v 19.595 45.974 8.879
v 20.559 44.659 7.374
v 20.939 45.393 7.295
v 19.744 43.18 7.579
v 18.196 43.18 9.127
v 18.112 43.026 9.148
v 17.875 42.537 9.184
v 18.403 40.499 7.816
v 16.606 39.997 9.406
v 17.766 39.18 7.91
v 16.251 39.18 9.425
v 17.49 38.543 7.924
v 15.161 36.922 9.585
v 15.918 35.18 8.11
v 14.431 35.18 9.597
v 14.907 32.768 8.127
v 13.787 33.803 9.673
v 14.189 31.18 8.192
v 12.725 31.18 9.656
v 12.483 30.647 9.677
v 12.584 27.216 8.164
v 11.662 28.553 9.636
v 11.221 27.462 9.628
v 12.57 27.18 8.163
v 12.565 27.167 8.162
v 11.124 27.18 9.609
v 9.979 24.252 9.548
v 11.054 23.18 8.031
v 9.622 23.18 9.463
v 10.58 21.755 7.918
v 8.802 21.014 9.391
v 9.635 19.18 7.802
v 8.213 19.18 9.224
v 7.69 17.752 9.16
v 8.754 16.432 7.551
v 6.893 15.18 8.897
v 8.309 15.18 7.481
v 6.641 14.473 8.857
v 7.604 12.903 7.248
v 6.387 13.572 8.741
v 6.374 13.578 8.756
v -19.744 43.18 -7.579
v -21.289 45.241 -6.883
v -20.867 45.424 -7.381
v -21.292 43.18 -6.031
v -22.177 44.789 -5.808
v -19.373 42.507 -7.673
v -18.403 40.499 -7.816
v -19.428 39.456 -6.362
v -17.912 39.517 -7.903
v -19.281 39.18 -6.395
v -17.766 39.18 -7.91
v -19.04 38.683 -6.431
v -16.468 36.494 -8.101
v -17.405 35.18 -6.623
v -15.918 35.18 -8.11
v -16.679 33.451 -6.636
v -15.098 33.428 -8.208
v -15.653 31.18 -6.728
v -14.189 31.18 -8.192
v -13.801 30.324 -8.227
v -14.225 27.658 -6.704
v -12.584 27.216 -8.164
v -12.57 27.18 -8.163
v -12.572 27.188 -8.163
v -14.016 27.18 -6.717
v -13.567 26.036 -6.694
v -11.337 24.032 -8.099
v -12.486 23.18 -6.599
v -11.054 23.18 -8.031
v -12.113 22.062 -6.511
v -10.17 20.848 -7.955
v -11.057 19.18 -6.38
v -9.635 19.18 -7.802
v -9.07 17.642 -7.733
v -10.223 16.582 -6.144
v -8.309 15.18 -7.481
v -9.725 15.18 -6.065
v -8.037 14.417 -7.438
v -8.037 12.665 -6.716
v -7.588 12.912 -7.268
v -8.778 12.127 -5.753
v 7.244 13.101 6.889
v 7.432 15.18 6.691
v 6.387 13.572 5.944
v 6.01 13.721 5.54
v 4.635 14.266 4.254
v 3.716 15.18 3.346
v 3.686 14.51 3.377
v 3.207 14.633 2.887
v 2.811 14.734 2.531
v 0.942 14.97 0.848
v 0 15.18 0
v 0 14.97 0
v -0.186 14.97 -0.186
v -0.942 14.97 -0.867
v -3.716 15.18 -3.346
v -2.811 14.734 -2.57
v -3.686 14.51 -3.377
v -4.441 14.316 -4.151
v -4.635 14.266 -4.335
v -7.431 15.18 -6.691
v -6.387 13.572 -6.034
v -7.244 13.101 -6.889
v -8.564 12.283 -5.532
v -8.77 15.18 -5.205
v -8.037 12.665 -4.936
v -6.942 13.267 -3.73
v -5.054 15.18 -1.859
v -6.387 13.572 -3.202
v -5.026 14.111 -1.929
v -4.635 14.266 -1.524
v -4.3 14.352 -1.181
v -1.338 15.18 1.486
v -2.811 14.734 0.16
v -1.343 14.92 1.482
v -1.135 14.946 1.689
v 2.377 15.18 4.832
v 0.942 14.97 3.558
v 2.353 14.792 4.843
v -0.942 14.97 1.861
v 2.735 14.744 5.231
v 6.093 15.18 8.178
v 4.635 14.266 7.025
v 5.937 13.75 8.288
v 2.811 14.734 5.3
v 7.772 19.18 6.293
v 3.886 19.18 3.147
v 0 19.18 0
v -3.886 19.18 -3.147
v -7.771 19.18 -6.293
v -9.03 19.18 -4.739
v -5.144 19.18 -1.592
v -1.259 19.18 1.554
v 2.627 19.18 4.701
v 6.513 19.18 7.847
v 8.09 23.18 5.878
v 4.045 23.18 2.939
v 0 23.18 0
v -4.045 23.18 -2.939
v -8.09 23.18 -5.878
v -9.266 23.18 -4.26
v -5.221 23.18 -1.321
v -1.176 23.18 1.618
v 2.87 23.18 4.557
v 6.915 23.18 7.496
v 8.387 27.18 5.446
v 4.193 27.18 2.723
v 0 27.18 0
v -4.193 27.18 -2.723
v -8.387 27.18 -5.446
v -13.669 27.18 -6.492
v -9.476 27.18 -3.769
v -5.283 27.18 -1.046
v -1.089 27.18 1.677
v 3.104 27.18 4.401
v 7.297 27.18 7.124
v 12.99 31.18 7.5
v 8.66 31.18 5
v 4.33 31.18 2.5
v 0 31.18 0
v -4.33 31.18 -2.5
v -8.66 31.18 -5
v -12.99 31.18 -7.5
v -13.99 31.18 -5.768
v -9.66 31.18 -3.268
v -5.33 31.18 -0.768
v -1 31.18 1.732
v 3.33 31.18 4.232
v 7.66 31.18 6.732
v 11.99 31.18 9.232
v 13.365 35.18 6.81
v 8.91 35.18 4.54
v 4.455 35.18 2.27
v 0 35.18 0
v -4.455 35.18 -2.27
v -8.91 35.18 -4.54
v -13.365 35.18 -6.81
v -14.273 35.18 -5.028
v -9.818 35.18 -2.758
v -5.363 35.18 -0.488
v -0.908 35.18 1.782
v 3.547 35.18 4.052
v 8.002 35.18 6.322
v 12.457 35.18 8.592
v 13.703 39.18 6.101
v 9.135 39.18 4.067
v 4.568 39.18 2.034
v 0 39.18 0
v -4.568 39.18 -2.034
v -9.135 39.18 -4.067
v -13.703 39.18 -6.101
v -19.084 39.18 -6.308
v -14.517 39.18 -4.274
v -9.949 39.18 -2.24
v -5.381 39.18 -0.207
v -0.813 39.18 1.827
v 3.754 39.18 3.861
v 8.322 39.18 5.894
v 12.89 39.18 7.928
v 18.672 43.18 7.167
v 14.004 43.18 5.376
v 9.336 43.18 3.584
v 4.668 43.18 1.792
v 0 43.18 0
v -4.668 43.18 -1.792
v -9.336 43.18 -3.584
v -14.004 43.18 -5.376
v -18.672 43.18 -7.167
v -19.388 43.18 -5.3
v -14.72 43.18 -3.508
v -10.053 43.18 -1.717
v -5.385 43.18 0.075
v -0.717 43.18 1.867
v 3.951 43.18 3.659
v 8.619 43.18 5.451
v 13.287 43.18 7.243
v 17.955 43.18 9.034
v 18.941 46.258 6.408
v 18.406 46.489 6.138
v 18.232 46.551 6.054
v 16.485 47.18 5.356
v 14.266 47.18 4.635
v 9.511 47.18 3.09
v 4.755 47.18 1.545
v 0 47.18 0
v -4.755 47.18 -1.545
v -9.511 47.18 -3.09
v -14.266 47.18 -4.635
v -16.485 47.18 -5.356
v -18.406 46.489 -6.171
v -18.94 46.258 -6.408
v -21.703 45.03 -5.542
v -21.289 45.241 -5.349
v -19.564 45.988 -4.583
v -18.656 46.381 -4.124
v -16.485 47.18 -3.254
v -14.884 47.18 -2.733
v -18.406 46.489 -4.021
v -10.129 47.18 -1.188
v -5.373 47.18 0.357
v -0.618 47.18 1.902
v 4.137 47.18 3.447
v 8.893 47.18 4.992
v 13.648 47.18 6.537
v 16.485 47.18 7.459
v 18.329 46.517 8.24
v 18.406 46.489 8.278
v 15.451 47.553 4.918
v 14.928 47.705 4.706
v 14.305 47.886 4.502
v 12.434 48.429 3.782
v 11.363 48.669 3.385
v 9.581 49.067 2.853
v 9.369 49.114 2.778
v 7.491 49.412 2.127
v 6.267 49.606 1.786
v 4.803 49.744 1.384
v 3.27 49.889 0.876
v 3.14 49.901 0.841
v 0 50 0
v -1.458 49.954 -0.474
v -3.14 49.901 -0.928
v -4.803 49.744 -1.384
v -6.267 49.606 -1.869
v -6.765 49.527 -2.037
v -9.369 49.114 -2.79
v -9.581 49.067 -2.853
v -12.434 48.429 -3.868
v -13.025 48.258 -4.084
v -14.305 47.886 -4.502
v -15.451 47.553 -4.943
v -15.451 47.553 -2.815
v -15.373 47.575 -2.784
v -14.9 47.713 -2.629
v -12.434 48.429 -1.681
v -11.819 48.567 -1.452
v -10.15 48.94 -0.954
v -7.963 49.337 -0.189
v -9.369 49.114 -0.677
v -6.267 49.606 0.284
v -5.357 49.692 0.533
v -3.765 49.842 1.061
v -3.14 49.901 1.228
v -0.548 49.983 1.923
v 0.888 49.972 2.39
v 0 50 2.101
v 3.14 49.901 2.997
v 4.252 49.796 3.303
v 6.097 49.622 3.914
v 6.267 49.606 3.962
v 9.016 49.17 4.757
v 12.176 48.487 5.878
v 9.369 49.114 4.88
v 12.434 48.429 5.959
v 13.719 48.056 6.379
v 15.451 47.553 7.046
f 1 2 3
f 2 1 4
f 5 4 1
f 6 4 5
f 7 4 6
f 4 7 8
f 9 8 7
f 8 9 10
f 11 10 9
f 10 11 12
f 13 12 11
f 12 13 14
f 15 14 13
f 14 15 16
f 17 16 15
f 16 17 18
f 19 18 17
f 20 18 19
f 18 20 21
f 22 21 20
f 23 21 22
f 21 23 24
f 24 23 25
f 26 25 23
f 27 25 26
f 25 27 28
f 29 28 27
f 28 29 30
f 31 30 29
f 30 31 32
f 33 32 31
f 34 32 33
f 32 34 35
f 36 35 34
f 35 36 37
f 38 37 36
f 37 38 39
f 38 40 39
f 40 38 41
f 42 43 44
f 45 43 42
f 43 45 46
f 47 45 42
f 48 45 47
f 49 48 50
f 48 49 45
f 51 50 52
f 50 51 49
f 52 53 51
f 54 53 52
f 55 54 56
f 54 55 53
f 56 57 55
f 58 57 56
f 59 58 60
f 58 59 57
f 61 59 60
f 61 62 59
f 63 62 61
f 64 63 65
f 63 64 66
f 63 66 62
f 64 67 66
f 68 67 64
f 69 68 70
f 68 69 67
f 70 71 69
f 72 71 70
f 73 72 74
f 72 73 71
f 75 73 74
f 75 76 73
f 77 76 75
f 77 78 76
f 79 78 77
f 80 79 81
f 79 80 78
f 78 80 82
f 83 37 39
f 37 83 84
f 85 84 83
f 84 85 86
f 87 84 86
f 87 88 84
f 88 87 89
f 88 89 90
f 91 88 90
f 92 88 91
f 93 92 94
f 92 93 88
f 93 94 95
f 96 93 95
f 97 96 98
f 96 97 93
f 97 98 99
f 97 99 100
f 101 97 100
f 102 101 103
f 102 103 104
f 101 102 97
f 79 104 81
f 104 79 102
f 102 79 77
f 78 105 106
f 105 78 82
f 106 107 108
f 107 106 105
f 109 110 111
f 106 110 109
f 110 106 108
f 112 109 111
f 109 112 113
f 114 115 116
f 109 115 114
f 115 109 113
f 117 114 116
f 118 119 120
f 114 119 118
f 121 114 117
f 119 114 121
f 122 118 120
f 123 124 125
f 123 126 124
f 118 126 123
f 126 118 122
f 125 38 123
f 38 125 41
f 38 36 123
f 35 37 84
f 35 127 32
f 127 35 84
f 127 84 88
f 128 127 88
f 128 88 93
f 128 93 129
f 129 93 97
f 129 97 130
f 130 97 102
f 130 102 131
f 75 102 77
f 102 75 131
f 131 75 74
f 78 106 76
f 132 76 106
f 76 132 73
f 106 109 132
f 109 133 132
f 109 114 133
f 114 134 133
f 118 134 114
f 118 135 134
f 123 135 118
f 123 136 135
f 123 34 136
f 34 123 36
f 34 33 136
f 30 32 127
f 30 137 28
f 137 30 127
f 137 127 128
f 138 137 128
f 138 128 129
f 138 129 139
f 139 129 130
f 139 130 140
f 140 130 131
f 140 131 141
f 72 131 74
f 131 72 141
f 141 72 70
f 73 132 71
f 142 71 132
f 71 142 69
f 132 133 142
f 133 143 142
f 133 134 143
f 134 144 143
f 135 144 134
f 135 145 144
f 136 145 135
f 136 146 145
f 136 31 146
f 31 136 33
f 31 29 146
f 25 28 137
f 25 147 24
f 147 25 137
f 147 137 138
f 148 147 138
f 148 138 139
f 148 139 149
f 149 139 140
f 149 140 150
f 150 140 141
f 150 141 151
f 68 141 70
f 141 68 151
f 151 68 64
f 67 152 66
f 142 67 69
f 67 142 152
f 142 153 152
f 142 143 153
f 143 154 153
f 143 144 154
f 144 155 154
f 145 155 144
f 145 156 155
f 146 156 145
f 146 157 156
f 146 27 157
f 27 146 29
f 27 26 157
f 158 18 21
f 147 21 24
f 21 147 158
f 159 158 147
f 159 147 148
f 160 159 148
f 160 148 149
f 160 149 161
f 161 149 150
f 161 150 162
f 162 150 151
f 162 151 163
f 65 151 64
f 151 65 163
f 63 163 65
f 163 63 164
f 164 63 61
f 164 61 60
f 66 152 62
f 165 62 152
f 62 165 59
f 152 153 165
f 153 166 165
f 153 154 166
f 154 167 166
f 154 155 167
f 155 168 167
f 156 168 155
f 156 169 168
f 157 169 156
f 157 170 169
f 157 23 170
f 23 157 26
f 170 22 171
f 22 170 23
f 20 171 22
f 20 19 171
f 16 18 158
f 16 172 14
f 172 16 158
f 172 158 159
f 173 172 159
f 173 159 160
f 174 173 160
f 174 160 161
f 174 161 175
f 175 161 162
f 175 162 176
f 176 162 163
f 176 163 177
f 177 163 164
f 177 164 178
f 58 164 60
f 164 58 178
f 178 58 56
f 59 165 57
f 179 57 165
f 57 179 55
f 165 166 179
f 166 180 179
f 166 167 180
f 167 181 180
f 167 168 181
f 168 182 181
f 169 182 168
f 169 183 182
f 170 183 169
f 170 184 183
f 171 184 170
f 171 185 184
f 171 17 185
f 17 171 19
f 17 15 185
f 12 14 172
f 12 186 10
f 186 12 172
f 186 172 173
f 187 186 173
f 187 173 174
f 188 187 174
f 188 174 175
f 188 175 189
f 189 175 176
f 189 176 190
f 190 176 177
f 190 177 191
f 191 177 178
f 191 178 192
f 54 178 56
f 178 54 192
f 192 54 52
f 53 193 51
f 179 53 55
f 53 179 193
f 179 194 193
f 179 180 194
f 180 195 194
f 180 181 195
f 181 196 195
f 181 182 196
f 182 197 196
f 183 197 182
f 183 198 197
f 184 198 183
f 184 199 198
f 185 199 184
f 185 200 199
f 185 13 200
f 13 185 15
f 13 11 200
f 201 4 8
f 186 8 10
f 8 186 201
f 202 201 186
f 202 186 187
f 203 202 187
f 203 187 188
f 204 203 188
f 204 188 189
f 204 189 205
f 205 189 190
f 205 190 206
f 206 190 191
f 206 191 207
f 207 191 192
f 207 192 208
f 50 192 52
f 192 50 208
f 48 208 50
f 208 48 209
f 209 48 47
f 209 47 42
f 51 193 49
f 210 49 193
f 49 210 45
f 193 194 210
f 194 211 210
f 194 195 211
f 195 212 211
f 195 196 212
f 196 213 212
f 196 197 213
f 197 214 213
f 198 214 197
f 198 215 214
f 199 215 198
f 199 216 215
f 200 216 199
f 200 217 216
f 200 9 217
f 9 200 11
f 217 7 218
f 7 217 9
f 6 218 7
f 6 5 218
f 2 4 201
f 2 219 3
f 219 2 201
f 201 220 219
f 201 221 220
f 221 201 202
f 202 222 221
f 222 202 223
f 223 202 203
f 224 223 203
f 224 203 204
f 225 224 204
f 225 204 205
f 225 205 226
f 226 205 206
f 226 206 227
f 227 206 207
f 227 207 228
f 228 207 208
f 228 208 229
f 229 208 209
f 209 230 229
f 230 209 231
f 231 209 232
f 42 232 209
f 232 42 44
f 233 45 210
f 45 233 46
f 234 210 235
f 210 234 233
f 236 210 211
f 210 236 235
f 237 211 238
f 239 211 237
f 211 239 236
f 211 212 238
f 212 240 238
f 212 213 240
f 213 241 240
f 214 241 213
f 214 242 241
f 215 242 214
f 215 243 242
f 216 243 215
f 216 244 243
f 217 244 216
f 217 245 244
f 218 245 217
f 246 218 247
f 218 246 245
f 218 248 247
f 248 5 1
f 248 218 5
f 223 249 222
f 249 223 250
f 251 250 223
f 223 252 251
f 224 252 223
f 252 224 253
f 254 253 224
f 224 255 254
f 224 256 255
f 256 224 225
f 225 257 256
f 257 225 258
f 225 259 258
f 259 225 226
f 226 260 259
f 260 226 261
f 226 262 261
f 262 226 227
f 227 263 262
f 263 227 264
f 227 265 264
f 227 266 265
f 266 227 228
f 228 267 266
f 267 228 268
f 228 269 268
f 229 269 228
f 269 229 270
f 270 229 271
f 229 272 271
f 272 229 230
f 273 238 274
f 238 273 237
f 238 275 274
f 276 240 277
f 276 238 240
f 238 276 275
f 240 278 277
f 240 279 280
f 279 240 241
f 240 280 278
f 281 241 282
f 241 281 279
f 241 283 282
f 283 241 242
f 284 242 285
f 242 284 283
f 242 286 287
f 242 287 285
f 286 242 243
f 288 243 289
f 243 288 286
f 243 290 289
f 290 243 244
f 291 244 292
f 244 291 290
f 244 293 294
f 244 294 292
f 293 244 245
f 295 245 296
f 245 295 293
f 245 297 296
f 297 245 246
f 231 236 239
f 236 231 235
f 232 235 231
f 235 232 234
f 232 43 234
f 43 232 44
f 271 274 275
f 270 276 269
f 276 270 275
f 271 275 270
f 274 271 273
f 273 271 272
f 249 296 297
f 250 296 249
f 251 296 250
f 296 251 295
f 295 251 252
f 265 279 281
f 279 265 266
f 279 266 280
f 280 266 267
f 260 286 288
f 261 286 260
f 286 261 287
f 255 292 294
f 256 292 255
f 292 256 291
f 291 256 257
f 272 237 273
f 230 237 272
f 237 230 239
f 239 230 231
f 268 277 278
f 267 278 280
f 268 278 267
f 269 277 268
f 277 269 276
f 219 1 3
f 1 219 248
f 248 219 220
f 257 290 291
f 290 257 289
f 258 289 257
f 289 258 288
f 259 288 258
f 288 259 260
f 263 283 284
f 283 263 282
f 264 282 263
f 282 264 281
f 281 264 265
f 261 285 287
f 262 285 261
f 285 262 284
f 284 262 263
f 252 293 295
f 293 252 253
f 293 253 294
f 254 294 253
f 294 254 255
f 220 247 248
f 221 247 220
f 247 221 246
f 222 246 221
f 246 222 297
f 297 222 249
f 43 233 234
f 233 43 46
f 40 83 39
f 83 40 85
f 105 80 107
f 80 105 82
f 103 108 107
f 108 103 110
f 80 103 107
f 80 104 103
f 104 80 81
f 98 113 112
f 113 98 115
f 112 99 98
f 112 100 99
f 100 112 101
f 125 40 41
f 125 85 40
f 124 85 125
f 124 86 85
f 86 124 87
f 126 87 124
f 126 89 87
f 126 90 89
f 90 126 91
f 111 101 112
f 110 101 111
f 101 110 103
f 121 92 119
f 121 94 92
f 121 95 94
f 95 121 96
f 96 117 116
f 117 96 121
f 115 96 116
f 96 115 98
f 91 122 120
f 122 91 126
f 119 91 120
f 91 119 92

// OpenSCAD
module fan_wheel(
    outer_radius = 55,
    inner_radius = 15,
    blade_count = 8,
    outer_width = 50,
    inner_width = 20,
    thickness = 2,
    twist = -30,
    angle_of_attack = 45,
) {
    
    module blade() {
        
        inner_height = cos( asin( inner_width / ( 2 * inner_radius ) )) * inner_radius;
        
        blade_height = outer_radius - inner_radius;
        
        width = outer_width / 2 - inner_width / 2;
        
        depth = 
            sqrt(
                pow( ( outer_width / 2 * cos( abs ( twist ) ) ) -
                        ( inner_width / 2 ), 2 ) +
                pow (blade_height, 2 )
            ) + thickness;
        
        height = sin ( abs ( twist ) ) * outer_width / 2 + thickness;
        
        angle = 
            atan(
                    ( ( outer_width / 2 * cos( abs ( twist ) ) ) -
                        ( inner_width / 2 )
                    ) / blade_height
            );
        
        blade_divisions = 10;
        
        difference() {
        
            intersection() {
            
                rotate( [ 0, -angle_of_attack, 0] )
                    difference() {
                    
                        translate( [ 0, inner_height, 0 ])
                        rotate( [-90, 0, 0 ] )
                        linear_extrude(
                            height = blade_height,
                            twist = twist,
                            slices = 10,
                            convexity = 10
                        )
                        translate( [ -outer_width / 2, -thickness])
                        polygon(
                            concat(
                                [for ( i = [ 0: blade_divisions])
                                    [ i * outer_width / blade_divisions, (i % 2) * 0.0001 ]
                                    ],
                                [for (i = [blade_divisions : -1 : 0])
                                    [ i * outer_width / blade_divisions, thickness + ( i % 2) * 0.0001]
                                    ]                        
                            )
                        );
                        
                        for ( i = [0 : 1])
                        mirror( [i, 0, 0] )
                        translate( [ inner_width / 2, inner_height, -height ] )
                        rotate( [ 0, 0, -angle] )
                        translate( [ 0, -depth / 2, 0 ] )
                        cube( [ width * 2, depth * 1.5, 2 * height] );
                    }
                
                // outer radius
                translate( [ 0, 0, -height] )
                cylinder( r = outer_radius - 5, h = 2 * height, $fn = 100); // adjust r to have 5 smaller
            
            }
            
            // inner radius
            translate( [0, 0, -height] )
            cylinder( r = inner_radius, h = 2 * height, $fn = 50);   
        
        }

        
    }
    
    blade(); // debug
}

fan_wheel();
